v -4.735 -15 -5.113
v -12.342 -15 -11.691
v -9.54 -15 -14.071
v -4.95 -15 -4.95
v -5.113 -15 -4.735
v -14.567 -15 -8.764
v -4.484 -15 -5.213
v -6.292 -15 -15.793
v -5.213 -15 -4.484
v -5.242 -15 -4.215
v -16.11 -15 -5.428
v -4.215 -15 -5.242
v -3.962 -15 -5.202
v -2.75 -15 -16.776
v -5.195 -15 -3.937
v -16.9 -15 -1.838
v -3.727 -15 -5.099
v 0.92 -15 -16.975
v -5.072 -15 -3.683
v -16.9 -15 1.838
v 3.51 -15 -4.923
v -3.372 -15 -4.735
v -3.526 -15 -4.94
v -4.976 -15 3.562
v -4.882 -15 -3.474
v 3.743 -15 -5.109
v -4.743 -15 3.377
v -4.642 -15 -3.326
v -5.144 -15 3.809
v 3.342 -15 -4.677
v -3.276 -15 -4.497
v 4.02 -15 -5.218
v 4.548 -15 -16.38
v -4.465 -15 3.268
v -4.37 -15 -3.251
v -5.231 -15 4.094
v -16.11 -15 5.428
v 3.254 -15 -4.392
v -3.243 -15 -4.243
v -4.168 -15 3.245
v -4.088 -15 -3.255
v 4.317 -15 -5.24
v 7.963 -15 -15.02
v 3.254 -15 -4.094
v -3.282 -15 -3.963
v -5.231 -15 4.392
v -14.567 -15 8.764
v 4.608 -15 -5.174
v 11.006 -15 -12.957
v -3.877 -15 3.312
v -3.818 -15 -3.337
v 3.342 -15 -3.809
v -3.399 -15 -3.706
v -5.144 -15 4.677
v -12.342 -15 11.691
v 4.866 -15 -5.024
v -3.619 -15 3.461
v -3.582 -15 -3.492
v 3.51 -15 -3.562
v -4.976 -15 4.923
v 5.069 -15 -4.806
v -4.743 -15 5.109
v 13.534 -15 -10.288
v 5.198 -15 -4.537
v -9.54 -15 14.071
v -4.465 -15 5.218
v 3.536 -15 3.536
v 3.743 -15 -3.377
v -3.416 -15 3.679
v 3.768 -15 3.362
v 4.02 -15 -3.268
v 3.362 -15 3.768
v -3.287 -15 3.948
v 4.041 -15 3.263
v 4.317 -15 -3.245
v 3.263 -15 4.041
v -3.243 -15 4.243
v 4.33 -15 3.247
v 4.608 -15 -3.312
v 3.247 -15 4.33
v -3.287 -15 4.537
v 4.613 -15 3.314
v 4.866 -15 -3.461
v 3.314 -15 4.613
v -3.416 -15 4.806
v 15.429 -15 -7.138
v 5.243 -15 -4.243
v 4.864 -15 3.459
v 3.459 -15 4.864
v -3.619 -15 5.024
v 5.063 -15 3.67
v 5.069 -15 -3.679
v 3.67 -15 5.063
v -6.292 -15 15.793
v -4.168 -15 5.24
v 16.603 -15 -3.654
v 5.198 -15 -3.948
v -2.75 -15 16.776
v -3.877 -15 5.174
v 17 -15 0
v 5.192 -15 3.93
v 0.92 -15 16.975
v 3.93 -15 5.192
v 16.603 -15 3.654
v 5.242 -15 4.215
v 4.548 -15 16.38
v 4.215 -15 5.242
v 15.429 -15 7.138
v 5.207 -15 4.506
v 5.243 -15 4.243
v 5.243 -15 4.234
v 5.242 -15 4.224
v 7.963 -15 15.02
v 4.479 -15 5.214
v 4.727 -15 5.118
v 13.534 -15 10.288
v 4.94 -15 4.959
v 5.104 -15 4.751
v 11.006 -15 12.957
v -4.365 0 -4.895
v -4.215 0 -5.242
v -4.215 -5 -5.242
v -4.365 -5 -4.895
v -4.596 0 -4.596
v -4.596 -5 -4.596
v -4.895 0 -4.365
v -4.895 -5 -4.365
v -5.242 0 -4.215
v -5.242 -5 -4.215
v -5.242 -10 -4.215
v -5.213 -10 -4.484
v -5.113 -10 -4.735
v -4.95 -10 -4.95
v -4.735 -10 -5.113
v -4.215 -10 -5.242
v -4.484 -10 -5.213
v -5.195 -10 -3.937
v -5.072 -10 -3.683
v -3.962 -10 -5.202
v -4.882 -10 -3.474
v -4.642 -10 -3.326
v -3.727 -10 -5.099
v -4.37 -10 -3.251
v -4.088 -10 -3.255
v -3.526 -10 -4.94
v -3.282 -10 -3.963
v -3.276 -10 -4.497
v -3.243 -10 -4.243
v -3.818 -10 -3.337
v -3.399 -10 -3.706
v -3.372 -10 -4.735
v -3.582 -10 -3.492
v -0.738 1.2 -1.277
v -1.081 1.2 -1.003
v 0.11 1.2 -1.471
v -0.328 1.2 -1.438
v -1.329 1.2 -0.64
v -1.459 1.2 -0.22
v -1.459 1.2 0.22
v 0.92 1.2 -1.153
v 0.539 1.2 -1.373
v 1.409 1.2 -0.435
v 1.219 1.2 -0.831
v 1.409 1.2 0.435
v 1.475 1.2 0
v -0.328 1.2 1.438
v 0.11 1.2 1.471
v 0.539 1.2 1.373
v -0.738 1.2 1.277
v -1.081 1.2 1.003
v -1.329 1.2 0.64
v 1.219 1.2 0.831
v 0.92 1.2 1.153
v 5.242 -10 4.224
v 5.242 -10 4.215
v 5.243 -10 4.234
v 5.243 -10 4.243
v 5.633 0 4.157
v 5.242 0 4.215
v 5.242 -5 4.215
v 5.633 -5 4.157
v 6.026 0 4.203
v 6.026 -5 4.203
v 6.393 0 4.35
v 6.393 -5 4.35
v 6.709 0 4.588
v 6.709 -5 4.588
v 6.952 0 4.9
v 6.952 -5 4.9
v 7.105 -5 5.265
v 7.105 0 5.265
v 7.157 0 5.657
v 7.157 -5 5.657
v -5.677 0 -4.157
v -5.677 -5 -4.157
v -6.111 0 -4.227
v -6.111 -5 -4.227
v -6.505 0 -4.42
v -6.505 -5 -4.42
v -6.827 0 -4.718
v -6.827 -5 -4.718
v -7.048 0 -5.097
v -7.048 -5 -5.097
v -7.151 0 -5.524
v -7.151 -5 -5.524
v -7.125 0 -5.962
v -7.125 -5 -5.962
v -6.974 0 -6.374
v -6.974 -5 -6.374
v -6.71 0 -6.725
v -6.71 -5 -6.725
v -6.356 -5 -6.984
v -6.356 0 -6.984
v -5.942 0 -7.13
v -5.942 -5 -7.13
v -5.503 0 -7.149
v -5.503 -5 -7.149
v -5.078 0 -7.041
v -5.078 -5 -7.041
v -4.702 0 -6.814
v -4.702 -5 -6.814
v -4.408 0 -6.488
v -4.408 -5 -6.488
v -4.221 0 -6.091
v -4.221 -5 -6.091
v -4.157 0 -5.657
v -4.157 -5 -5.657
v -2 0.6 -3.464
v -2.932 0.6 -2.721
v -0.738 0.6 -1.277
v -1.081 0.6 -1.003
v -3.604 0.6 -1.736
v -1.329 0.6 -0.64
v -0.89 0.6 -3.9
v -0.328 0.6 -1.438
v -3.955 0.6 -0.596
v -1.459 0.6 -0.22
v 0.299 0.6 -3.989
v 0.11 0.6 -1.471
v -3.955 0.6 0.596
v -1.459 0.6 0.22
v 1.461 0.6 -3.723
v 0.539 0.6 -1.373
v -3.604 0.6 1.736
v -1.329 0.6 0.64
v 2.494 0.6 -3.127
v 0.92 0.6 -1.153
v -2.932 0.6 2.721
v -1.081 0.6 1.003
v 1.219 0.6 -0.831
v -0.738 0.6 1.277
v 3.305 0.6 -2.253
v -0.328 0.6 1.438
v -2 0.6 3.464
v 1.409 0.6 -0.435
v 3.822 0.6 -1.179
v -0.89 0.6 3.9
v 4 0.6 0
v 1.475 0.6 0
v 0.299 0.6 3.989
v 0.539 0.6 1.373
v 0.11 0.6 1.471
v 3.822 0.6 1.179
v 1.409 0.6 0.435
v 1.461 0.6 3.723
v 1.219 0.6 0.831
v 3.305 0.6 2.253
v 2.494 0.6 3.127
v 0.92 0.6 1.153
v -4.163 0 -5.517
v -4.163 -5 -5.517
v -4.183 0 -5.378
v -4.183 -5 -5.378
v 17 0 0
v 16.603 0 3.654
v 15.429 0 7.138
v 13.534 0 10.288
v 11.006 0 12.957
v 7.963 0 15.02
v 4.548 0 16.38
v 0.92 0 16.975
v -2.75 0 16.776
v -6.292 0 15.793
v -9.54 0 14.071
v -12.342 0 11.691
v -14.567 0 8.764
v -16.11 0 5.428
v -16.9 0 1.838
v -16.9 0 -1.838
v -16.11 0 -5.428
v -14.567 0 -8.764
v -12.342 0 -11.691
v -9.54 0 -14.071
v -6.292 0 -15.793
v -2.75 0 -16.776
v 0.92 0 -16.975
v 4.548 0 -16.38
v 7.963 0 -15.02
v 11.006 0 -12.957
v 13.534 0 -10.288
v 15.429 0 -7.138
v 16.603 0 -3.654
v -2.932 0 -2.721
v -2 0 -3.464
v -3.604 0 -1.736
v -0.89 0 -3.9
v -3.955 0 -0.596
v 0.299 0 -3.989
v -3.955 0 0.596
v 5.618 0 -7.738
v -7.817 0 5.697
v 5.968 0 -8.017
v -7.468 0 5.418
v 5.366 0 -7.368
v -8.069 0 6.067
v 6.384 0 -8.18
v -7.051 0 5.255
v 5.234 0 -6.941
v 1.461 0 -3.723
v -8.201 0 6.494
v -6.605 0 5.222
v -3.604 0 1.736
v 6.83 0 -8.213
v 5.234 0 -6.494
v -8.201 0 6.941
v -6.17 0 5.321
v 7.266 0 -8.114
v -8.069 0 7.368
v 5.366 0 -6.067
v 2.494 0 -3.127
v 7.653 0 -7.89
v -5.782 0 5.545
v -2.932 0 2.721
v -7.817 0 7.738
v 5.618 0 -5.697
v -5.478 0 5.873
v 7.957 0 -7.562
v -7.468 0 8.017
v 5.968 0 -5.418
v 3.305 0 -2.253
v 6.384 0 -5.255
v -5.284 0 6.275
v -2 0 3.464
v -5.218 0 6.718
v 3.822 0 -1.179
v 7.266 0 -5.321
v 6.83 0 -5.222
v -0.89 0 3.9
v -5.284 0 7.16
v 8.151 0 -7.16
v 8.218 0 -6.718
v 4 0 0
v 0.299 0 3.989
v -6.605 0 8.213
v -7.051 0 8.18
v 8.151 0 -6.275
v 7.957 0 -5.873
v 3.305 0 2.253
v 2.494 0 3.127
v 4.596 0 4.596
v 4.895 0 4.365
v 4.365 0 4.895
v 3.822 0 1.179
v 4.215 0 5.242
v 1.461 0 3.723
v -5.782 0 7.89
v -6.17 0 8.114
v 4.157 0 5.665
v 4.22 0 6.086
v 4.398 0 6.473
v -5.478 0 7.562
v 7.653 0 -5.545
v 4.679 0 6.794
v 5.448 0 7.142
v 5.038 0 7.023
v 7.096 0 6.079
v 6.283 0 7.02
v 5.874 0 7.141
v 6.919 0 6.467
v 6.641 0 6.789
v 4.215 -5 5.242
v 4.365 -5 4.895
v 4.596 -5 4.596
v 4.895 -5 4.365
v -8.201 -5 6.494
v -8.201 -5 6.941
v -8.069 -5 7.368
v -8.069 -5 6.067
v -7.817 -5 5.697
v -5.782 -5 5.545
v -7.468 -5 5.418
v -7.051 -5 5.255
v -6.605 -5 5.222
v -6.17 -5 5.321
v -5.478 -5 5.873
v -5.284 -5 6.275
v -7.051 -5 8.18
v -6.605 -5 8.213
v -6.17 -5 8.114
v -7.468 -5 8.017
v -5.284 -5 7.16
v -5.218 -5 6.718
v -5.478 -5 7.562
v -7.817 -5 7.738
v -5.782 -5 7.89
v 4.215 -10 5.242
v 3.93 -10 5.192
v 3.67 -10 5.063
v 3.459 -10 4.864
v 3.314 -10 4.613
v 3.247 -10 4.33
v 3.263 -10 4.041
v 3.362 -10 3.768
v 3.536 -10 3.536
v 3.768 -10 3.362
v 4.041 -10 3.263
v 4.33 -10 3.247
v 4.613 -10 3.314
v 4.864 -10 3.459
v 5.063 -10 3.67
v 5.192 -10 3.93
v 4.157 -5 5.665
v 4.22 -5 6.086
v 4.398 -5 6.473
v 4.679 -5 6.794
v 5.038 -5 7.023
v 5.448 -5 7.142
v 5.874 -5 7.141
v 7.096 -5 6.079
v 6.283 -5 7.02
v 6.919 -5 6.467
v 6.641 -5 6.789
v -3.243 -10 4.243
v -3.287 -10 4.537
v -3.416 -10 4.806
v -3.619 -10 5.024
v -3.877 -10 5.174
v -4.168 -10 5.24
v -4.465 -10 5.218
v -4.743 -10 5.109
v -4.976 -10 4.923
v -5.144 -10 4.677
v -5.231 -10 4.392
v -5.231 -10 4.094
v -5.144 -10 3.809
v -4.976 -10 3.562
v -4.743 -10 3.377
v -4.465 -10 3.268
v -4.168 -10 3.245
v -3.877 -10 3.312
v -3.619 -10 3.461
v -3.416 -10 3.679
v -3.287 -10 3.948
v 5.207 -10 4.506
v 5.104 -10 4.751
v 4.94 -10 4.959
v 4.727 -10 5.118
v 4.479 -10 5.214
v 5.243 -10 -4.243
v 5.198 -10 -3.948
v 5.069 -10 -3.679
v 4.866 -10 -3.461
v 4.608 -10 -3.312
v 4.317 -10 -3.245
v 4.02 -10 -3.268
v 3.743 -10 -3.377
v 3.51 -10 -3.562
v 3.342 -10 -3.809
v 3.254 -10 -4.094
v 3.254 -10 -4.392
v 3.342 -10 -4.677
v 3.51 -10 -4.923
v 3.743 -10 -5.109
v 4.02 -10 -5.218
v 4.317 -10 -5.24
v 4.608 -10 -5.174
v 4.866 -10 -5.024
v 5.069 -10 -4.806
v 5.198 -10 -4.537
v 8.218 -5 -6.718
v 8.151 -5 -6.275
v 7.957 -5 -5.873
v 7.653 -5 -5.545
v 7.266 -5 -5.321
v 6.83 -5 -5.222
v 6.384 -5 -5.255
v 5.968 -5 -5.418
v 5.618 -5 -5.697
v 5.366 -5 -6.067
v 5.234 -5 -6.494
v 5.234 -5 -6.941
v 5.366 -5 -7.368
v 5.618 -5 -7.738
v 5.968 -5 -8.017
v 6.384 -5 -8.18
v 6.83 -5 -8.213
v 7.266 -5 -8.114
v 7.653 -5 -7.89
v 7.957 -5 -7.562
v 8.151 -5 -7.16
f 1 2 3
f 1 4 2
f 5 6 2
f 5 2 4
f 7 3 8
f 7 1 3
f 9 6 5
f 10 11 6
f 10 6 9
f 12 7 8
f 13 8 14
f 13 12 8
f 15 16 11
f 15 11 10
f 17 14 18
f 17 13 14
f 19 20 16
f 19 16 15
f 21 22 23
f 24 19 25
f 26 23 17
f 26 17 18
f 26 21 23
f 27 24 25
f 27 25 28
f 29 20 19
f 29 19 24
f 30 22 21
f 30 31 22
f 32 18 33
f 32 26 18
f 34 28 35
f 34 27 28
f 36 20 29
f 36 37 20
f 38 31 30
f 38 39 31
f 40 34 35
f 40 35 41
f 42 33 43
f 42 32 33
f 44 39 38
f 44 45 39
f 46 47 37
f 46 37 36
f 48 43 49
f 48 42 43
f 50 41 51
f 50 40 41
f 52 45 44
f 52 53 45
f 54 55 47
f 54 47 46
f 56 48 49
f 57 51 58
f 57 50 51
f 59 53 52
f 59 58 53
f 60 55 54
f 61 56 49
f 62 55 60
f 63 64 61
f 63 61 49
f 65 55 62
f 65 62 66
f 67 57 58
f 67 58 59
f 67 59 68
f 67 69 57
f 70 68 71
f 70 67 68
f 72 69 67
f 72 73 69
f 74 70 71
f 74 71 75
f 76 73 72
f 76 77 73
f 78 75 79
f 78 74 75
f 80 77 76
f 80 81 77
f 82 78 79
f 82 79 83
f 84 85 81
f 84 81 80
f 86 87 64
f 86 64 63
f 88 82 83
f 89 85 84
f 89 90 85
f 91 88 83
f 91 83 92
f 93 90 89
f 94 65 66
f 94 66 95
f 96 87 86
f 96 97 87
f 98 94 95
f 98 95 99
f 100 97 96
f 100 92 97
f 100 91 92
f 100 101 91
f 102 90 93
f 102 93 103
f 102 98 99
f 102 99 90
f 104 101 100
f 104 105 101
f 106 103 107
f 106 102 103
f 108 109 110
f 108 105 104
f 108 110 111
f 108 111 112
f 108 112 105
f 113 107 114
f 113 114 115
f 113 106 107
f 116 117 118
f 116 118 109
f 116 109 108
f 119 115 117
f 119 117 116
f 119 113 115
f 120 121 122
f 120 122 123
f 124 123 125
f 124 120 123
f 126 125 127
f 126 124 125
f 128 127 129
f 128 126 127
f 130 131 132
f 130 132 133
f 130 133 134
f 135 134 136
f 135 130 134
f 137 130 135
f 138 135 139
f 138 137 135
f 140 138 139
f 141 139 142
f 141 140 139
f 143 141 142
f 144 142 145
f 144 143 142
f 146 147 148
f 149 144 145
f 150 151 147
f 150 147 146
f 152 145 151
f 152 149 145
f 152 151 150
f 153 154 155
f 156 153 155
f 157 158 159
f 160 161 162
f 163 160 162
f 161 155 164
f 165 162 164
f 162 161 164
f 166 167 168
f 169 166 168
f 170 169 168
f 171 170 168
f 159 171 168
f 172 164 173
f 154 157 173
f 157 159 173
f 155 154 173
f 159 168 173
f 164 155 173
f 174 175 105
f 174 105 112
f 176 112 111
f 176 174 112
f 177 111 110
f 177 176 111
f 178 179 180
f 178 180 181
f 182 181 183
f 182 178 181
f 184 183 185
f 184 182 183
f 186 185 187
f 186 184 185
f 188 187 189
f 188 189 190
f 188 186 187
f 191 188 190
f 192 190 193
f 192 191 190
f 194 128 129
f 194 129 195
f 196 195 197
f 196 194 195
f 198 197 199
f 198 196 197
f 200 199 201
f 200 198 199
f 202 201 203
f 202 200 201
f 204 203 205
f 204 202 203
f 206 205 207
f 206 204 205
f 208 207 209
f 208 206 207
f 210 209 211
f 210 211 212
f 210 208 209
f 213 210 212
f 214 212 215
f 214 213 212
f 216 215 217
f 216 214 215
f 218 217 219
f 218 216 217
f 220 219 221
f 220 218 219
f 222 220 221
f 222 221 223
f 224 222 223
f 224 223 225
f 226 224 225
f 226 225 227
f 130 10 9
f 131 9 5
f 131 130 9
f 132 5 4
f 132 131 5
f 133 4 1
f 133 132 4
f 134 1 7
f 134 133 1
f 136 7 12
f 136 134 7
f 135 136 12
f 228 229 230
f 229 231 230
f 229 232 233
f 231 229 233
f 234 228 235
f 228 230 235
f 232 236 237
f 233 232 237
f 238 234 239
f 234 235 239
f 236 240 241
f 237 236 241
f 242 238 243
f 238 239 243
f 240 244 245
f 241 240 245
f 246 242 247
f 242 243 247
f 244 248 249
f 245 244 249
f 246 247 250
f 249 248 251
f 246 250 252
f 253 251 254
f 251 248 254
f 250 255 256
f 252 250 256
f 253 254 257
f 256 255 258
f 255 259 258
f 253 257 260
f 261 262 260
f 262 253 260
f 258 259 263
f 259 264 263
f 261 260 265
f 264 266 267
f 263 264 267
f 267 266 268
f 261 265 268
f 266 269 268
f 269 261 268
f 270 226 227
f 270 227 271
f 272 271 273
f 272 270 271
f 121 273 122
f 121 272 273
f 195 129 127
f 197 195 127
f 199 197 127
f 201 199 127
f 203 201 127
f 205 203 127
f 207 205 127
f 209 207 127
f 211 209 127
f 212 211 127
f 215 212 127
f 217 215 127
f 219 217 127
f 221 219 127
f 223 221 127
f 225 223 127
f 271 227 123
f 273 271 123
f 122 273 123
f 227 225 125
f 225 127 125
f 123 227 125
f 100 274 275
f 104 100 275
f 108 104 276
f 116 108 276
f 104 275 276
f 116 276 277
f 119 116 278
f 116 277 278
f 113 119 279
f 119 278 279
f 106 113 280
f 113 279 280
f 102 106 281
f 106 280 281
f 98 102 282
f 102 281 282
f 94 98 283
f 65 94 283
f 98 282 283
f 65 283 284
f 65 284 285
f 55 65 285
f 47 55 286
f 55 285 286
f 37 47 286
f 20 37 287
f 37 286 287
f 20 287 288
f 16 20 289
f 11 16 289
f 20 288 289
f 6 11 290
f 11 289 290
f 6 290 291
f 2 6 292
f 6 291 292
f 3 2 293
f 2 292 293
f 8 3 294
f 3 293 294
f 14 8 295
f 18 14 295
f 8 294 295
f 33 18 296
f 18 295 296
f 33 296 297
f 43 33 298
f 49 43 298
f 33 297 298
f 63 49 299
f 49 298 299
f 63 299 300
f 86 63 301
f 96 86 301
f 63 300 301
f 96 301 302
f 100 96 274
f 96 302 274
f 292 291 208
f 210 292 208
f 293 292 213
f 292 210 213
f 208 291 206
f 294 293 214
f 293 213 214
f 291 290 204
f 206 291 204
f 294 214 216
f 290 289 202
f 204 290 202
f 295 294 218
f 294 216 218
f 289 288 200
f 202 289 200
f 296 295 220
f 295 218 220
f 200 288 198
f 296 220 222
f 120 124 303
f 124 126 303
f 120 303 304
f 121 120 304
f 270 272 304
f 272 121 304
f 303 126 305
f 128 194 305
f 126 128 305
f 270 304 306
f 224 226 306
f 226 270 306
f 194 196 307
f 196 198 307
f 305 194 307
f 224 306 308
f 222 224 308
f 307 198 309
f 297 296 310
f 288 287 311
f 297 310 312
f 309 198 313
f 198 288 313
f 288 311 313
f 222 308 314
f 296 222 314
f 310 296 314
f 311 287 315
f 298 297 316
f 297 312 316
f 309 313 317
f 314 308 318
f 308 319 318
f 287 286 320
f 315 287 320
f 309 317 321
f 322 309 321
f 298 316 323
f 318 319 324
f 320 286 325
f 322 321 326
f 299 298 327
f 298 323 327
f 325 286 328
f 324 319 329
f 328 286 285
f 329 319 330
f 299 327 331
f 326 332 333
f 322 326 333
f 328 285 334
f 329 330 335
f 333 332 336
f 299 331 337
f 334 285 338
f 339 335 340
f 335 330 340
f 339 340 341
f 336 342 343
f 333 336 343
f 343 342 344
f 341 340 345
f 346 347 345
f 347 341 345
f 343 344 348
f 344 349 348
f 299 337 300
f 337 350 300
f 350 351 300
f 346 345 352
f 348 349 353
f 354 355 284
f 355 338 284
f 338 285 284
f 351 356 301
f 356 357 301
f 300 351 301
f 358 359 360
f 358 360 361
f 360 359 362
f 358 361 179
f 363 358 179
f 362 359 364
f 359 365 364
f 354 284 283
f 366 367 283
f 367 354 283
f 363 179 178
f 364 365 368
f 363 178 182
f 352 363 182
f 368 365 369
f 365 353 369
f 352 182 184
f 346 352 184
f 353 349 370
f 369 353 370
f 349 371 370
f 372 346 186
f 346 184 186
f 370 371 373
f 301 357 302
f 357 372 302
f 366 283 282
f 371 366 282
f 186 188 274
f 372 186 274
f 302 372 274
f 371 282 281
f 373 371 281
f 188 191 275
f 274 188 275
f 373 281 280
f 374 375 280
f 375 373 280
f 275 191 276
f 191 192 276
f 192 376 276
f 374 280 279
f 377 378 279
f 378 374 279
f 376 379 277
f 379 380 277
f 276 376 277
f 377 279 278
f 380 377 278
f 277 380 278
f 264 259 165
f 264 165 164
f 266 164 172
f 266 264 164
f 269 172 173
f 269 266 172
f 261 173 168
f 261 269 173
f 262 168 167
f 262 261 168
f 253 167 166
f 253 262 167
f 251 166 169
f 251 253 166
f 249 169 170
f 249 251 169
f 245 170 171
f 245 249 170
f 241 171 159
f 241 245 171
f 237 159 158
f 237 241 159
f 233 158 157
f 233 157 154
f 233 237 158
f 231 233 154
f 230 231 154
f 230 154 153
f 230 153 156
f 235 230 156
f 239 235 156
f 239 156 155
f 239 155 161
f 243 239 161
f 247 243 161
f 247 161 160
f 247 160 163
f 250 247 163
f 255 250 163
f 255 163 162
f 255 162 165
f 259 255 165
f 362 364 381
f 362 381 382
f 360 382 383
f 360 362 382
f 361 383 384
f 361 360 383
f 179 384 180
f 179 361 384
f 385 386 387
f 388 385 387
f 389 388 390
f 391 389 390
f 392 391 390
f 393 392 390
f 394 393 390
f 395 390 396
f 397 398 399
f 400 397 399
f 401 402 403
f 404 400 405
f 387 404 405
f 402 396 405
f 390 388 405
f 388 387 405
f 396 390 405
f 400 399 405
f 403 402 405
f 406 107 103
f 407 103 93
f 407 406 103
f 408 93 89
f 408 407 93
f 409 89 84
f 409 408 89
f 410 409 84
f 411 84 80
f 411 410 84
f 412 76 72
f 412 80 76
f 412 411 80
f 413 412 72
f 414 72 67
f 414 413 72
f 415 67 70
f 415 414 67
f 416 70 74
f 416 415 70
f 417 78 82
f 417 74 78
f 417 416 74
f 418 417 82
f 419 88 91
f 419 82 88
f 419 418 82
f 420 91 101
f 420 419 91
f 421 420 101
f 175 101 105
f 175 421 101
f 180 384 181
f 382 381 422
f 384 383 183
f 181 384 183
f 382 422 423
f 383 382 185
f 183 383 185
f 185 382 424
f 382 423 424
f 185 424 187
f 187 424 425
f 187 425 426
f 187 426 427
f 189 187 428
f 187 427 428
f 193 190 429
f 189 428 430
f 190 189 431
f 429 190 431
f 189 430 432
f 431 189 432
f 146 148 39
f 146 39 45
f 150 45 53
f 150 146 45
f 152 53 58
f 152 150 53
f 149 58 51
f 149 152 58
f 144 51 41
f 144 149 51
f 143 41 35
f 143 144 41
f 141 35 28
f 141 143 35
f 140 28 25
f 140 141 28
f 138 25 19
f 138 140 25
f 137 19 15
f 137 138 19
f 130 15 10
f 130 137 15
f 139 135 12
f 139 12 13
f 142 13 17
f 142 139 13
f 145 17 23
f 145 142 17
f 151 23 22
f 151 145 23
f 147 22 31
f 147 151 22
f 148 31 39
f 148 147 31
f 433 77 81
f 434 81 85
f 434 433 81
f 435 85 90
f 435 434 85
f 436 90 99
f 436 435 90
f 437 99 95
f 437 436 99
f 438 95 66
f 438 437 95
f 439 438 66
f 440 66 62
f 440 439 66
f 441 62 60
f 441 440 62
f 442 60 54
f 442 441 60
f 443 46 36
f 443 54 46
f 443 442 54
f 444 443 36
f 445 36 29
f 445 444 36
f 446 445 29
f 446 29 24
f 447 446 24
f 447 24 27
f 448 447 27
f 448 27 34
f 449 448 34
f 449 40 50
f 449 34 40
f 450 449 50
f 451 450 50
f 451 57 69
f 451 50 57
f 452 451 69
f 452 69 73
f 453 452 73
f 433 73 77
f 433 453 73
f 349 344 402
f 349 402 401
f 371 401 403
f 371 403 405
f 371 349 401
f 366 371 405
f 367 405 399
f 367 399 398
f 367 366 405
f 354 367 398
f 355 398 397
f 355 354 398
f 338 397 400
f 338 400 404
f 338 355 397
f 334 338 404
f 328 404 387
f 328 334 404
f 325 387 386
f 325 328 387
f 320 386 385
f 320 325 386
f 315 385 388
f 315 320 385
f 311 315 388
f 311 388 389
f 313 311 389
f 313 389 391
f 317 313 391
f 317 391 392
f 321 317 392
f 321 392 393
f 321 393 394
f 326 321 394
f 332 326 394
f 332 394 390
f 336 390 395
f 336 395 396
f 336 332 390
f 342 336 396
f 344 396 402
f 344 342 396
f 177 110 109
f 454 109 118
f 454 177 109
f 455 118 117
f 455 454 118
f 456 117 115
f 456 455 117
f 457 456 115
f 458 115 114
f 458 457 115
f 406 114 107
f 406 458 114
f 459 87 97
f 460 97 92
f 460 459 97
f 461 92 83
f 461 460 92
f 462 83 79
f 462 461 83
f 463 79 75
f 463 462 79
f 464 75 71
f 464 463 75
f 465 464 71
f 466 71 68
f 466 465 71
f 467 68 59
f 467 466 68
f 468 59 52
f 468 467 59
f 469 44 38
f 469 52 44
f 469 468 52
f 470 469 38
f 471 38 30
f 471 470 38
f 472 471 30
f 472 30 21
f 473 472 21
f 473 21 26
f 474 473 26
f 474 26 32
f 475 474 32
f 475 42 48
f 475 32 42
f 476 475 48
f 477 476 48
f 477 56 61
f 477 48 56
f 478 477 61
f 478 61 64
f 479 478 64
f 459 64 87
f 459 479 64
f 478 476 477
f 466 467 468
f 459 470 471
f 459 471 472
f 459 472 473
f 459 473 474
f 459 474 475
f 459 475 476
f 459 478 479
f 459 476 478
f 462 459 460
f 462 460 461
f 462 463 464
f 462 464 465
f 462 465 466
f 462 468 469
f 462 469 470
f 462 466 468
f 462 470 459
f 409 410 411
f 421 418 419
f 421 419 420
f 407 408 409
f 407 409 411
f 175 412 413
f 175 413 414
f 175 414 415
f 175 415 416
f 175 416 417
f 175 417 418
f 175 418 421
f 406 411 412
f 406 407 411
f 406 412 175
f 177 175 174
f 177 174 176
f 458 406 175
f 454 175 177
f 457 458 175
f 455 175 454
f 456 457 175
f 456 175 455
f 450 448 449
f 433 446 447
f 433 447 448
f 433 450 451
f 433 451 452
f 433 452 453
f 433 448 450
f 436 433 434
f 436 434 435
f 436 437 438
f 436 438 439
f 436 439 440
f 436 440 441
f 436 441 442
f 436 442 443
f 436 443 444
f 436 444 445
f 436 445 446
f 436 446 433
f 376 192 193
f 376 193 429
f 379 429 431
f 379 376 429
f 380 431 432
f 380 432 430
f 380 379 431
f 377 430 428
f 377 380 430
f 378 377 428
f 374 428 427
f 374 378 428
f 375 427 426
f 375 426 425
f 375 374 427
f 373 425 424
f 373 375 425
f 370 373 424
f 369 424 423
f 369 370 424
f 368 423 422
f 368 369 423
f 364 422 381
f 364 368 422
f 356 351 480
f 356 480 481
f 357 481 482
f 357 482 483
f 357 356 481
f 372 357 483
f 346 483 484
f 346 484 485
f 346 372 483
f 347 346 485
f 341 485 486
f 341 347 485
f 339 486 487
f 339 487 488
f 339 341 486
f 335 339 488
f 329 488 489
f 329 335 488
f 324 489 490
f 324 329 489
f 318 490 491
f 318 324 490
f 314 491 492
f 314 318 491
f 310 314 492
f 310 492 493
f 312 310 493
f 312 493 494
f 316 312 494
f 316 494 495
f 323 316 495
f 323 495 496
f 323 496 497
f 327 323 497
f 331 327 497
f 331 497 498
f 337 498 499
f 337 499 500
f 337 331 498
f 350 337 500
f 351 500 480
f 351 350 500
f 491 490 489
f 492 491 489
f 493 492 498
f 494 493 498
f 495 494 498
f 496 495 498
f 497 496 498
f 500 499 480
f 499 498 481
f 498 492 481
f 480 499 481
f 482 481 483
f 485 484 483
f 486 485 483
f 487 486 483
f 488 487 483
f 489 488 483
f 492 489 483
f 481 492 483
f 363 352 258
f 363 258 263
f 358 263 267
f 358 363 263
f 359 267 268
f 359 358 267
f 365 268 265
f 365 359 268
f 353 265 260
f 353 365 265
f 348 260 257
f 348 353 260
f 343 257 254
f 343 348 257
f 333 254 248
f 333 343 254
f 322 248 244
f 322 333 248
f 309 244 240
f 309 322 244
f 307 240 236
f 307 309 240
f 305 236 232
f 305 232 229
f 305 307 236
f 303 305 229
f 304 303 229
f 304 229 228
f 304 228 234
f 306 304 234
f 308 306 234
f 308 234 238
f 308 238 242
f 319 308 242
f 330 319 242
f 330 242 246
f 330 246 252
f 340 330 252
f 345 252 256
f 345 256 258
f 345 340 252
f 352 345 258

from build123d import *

# Parameters (mm, degrees)
F0_R     = 17
F0_R_2   = 1.5
F0_R_3   = 1
F0_R_4   = 4
F0_R_5   = 1.475
F1_DEPTH = 15
F2_START = 10
F2_DEPTH = 15
F3_DEPTH = 5
F4_DEPTH = 0.6
F5_DEPTH = 1.2


# Not quite as in the source:
# - a feature names something its author has since deleted; it is built from what else it names


with BuildPart() as f1:
    # F0 (on Front) → F1 (new body)
    with BuildSketch(Plane.XZ):
        Circle(F0_R)
        with BuildLine():
            ThreePointArc((-4.2152867015, -5.2422664968), (-4.1715341961, -5.447511614), (-4.1568542495, -5.6568542495))
            ThreePointArc((-4.1568542495, -5.6568542495), (-6.8551617286, -6.5591065343), (-5.2422664968, -4.2152867015))
            ThreePointArc((-5.2422664968, -4.2152867015), (-4.2289624147, -3.2427342391), (-3.2426406871, -4.2426406871))
            ThreePointArc((-3.2426406871, -4.2426406871), (-3.525928058, -4.9400093179), (-4.2152867015, -5.2422664968))
        make_face(mode=Mode.SUBTRACT)
        with Locations((6.7175144213, -6.7175144213)):
            Circle(F0_R_2, mode=Mode.SUBTRACT)
        with Locations((4.2426406871, -4.2426406871)):
            Circle(F0_R_3, mode=Mode.SUBTRACT)
        with Locations((-4.2426406871, 4.2426406871)):
            Circle(F0_R_3, mode=Mode.SUBTRACT)
        with Locations((-6.7175144213, 6.7175144213)):
            Circle(F0_R_2, mode=Mode.SUBTRACT)
        Circle(F0_R_4, mode=Mode.SUBTRACT)
        with BuildLine():
            ThreePointArc((4.2152867015, 5.2422664968), (5.447511614, 7.1421743029), (7.1568542495, 5.6568542495))
            ThreePointArc((7.1568542495, 5.6568542495), (6.5591065343, 4.4585467704), (5.2422664968, 4.2152867015))
            ThreePointArc((5.2422664968, 4.2152867015), (3.5355339059, 3.5355339059), (4.2152867015, 5.2422664968))
        make_face(mode=Mode.SUBTRACT)
        with BuildLine():
            ThreePointArc((5.2422664968, 4.2152867015), (6.5591065343, 4.4585467704), (7.1568542495, 5.6568542495))
            ThreePointArc((7.1568542495, 5.6568542495), (5.447511614, 7.1421743029), (4.2152867015, 5.2422664968))
            ThreePointArc((4.2152867015, 5.2422664968), (4.9400093179, 4.9593533163), (5.2426406871, 4.2426406871))
            ThreePointArc((5.2426406871, 4.2426406871), (5.2425471352, 4.2289624147), (5.2422664968, 4.2152867015))
        make_face()
        with BuildLine():
            ThreePointArc((5.2422664968, 4.2152867015), (4.5961940777, 4.5961940777), (4.2152867015, 5.2422664968))
            ThreePointArc((4.2152867015, 5.2422664968), (3.5355339059, 3.5355339059), (5.2422664968, 4.2152867015))
        make_face()
        with BuildLine():
            ThreePointArc((-5.2422664968, -4.2152867015), (-6.8551617286, -6.5591065343), (-4.1568542495, -5.6568542495))
            ThreePointArc((-4.1568542495, -5.6568542495), (-4.1715341961, -5.447511614), (-4.2152867015, -5.2422664968))
            ThreePointArc((-4.2152867015, -5.2422664968), (-4.9497474683, -4.9497474683), (-5.2422664968, -4.2152867015))
        make_face()
        with BuildLine():
            ThreePointArc((-5.2422664968, -4.2152867015), (-4.9497474683, -4.9497474683), (-4.2152867015, -5.2422664968))
            ThreePointArc((-4.2152867015, -5.2422664968), (-4.5961940777, -4.5961940777), (-5.2422664968, -4.2152867015))
        make_face()
        with BuildLine():
            ThreePointArc((-5.2422664968, -4.2152867015), (-4.5961940777, -4.5961940777), (-4.2152867015, -5.2422664968))
            ThreePointArc((-4.2152867015, -5.2422664968), (-3.525928058, -4.9400093179), (-3.2426406871, -4.2426406871))
            ThreePointArc((-3.2426406871, -4.2426406871), (-4.2289624147, -3.2427342391), (-5.2422664968, -4.2152867015))
        make_face()
        with BuildLine():
            ThreePointArc((5.2426406871, 4.2426406871), (4.9400093179, 4.9593533163), (4.2152867015, 5.2422664968))
            ThreePointArc((4.2152867015, 5.2422664968), (4.5961940777, 4.5961940777), (5.2422664968, 4.2152867015))
            ThreePointArc((5.2422664968, 4.2152867015), (5.2425471352, 4.2289624147), (5.2426406871, 4.2426406871))
        make_face()
        with Locations((4.2426406871, -4.2426406871)):
            Circle(F0_R_3)
        with Locations((-4.2426406871, 4.2426406871)):
            Circle(F0_R_3)
        with Locations((-6.7175144213, 6.7175144213)):
            Circle(F0_R_2)
        with Locations((6.7175144213, -6.7175144213)):
            Circle(F0_R_2)
        Circle(F0_R_4)
        Circle(F0_R_5, mode=Mode.SUBTRACT)
        Circle(F0_R_5)
    extrude(amount=F1_DEPTH)

    # F0 (on Front) → F2 (cut)
    with BuildSketch(Plane.XZ.offset(F2_START)):
        with BuildLine():
            ThreePointArc((-5.2422664968, -4.2152867015), (-4.5961940777, -4.5961940777), (-4.2152867015, -5.2422664968))
            ThreePointArc((-4.2152867015, -5.2422664968), (-3.525928058, -4.9400093179), (-3.2426406871, -4.2426406871))
            ThreePointArc((-3.2426406871, -4.2426406871), (-4.2289624147, -3.2427342391), (-5.2422664968, -4.2152867015))
        make_face()
        with BuildLine():
            ThreePointArc((-5.2422664968, -4.2152867015), (-4.9497474683, -4.9497474683), (-4.2152867015, -5.2422664968))
            ThreePointArc((-4.2152867015, -5.2422664968), (-4.5961940777, -4.5961940777), (-5.2422664968, -4.2152867015))
        make_face()
        with Locations((4.2426406871, -4.2426406871)):
            Circle(F0_R_3)
        with BuildLine():
            ThreePointArc((5.2422664968, 4.2152867015), (4.5961940777, 4.5961940777), (4.2152867015, 5.2422664968))
            ThreePointArc((4.2152867015, 5.2422664968), (3.5355339059, 3.5355339059), (5.2422664968, 4.2152867015))
        make_face()
        with BuildLine():
            ThreePointArc((5.2426406871, 4.2426406871), (4.9400093179, 4.9593533163), (4.2152867015, 5.2422664968))
            ThreePointArc((4.2152867015, 5.2422664968), (4.5961940777, 4.5961940777), (5.2422664968, 4.2152867015))
            ThreePointArc((5.2422664968, 4.2152867015), (5.2425471352, 4.2289624147), (5.2426406871, 4.2426406871))
        make_face()
        with Locations((-4.2426406871, 4.2426406871)):
            Circle(F0_R_3)
    extrude(amount=F2_DEPTH, mode=Mode.SUBTRACT)

    # F0 (on Front) → F3 (cut)
    with BuildSketch(Plane.XZ):
        with BuildLine():
            ThreePointArc((5.2422664968, 4.2152867015), (6.5591065343, 4.4585467704), (7.1568542495, 5.6568542495))
            ThreePointArc((7.1568542495, 5.6568542495), (5.447511614, 7.1421743029), (4.2152867015, 5.2422664968))
            ThreePointArc((4.2152867015, 5.2422664968), (4.9400093179, 4.9593533163), (5.2426406871, 4.2426406871))
            ThreePointArc((5.2426406871, 4.2426406871), (5.2425471352, 4.2289624147), (5.2422664968, 4.2152867015))
        make_face()
        with BuildLine():
            ThreePointArc((5.2426406871, 4.2426406871), (4.9400093179, 4.9593533163), (4.2152867015, 5.2422664968))
            ThreePointArc((4.2152867015, 5.2422664968), (4.5961940777, 4.5961940777), (5.2422664968, 4.2152867015))
            ThreePointArc((5.2422664968, 4.2152867015), (5.2425471352, 4.2289624147), (5.2426406871, 4.2426406871))
        make_face()
        with BuildLine():
            ThreePointArc((-5.2422664968, -4.2152867015), (-6.8551617286, -6.5591065343), (-4.1568542495, -5.6568542495))
            ThreePointArc((-4.1568542495, -5.6568542495), (-4.1715341961, -5.447511614), (-4.2152867015, -5.2422664968))
            ThreePointArc((-4.2152867015, -5.2422664968), (-4.9497474683, -4.9497474683), (-5.2422664968, -4.2152867015))
        make_face()
        with BuildLine():
            ThreePointArc((-5.2422664968, -4.2152867015), (-4.9497474683, -4.9497474683), (-4.2152867015, -5.2422664968))
            ThreePointArc((-4.2152867015, -5.2422664968), (-4.5961940777, -4.5961940777), (-5.2422664968, -4.2152867015))
        make_face()
        with Locations((6.7175144213, -6.7175144213)):
            Circle(F0_R_2)
        with Locations((-6.7175144213, 6.7175144213)):
            Circle(F0_R_2)
    extrude(amount=F3_DEPTH, mode=Mode.SUBTRACT)

    # F0 (on Front) → F4 (join)
    with BuildSketch(Plane.XZ):
        Circle(F0_R_4)
        Circle(F0_R_5, mode=Mode.SUBTRACT)
    extrude(amount=-F4_DEPTH)

    # F0 (on Front) → F5 (join)
    with BuildSketch(Plane.XZ):
        Circle(F0_R_5)
    extrude(amount=-F5_DEPTH)


solid = f1.part
